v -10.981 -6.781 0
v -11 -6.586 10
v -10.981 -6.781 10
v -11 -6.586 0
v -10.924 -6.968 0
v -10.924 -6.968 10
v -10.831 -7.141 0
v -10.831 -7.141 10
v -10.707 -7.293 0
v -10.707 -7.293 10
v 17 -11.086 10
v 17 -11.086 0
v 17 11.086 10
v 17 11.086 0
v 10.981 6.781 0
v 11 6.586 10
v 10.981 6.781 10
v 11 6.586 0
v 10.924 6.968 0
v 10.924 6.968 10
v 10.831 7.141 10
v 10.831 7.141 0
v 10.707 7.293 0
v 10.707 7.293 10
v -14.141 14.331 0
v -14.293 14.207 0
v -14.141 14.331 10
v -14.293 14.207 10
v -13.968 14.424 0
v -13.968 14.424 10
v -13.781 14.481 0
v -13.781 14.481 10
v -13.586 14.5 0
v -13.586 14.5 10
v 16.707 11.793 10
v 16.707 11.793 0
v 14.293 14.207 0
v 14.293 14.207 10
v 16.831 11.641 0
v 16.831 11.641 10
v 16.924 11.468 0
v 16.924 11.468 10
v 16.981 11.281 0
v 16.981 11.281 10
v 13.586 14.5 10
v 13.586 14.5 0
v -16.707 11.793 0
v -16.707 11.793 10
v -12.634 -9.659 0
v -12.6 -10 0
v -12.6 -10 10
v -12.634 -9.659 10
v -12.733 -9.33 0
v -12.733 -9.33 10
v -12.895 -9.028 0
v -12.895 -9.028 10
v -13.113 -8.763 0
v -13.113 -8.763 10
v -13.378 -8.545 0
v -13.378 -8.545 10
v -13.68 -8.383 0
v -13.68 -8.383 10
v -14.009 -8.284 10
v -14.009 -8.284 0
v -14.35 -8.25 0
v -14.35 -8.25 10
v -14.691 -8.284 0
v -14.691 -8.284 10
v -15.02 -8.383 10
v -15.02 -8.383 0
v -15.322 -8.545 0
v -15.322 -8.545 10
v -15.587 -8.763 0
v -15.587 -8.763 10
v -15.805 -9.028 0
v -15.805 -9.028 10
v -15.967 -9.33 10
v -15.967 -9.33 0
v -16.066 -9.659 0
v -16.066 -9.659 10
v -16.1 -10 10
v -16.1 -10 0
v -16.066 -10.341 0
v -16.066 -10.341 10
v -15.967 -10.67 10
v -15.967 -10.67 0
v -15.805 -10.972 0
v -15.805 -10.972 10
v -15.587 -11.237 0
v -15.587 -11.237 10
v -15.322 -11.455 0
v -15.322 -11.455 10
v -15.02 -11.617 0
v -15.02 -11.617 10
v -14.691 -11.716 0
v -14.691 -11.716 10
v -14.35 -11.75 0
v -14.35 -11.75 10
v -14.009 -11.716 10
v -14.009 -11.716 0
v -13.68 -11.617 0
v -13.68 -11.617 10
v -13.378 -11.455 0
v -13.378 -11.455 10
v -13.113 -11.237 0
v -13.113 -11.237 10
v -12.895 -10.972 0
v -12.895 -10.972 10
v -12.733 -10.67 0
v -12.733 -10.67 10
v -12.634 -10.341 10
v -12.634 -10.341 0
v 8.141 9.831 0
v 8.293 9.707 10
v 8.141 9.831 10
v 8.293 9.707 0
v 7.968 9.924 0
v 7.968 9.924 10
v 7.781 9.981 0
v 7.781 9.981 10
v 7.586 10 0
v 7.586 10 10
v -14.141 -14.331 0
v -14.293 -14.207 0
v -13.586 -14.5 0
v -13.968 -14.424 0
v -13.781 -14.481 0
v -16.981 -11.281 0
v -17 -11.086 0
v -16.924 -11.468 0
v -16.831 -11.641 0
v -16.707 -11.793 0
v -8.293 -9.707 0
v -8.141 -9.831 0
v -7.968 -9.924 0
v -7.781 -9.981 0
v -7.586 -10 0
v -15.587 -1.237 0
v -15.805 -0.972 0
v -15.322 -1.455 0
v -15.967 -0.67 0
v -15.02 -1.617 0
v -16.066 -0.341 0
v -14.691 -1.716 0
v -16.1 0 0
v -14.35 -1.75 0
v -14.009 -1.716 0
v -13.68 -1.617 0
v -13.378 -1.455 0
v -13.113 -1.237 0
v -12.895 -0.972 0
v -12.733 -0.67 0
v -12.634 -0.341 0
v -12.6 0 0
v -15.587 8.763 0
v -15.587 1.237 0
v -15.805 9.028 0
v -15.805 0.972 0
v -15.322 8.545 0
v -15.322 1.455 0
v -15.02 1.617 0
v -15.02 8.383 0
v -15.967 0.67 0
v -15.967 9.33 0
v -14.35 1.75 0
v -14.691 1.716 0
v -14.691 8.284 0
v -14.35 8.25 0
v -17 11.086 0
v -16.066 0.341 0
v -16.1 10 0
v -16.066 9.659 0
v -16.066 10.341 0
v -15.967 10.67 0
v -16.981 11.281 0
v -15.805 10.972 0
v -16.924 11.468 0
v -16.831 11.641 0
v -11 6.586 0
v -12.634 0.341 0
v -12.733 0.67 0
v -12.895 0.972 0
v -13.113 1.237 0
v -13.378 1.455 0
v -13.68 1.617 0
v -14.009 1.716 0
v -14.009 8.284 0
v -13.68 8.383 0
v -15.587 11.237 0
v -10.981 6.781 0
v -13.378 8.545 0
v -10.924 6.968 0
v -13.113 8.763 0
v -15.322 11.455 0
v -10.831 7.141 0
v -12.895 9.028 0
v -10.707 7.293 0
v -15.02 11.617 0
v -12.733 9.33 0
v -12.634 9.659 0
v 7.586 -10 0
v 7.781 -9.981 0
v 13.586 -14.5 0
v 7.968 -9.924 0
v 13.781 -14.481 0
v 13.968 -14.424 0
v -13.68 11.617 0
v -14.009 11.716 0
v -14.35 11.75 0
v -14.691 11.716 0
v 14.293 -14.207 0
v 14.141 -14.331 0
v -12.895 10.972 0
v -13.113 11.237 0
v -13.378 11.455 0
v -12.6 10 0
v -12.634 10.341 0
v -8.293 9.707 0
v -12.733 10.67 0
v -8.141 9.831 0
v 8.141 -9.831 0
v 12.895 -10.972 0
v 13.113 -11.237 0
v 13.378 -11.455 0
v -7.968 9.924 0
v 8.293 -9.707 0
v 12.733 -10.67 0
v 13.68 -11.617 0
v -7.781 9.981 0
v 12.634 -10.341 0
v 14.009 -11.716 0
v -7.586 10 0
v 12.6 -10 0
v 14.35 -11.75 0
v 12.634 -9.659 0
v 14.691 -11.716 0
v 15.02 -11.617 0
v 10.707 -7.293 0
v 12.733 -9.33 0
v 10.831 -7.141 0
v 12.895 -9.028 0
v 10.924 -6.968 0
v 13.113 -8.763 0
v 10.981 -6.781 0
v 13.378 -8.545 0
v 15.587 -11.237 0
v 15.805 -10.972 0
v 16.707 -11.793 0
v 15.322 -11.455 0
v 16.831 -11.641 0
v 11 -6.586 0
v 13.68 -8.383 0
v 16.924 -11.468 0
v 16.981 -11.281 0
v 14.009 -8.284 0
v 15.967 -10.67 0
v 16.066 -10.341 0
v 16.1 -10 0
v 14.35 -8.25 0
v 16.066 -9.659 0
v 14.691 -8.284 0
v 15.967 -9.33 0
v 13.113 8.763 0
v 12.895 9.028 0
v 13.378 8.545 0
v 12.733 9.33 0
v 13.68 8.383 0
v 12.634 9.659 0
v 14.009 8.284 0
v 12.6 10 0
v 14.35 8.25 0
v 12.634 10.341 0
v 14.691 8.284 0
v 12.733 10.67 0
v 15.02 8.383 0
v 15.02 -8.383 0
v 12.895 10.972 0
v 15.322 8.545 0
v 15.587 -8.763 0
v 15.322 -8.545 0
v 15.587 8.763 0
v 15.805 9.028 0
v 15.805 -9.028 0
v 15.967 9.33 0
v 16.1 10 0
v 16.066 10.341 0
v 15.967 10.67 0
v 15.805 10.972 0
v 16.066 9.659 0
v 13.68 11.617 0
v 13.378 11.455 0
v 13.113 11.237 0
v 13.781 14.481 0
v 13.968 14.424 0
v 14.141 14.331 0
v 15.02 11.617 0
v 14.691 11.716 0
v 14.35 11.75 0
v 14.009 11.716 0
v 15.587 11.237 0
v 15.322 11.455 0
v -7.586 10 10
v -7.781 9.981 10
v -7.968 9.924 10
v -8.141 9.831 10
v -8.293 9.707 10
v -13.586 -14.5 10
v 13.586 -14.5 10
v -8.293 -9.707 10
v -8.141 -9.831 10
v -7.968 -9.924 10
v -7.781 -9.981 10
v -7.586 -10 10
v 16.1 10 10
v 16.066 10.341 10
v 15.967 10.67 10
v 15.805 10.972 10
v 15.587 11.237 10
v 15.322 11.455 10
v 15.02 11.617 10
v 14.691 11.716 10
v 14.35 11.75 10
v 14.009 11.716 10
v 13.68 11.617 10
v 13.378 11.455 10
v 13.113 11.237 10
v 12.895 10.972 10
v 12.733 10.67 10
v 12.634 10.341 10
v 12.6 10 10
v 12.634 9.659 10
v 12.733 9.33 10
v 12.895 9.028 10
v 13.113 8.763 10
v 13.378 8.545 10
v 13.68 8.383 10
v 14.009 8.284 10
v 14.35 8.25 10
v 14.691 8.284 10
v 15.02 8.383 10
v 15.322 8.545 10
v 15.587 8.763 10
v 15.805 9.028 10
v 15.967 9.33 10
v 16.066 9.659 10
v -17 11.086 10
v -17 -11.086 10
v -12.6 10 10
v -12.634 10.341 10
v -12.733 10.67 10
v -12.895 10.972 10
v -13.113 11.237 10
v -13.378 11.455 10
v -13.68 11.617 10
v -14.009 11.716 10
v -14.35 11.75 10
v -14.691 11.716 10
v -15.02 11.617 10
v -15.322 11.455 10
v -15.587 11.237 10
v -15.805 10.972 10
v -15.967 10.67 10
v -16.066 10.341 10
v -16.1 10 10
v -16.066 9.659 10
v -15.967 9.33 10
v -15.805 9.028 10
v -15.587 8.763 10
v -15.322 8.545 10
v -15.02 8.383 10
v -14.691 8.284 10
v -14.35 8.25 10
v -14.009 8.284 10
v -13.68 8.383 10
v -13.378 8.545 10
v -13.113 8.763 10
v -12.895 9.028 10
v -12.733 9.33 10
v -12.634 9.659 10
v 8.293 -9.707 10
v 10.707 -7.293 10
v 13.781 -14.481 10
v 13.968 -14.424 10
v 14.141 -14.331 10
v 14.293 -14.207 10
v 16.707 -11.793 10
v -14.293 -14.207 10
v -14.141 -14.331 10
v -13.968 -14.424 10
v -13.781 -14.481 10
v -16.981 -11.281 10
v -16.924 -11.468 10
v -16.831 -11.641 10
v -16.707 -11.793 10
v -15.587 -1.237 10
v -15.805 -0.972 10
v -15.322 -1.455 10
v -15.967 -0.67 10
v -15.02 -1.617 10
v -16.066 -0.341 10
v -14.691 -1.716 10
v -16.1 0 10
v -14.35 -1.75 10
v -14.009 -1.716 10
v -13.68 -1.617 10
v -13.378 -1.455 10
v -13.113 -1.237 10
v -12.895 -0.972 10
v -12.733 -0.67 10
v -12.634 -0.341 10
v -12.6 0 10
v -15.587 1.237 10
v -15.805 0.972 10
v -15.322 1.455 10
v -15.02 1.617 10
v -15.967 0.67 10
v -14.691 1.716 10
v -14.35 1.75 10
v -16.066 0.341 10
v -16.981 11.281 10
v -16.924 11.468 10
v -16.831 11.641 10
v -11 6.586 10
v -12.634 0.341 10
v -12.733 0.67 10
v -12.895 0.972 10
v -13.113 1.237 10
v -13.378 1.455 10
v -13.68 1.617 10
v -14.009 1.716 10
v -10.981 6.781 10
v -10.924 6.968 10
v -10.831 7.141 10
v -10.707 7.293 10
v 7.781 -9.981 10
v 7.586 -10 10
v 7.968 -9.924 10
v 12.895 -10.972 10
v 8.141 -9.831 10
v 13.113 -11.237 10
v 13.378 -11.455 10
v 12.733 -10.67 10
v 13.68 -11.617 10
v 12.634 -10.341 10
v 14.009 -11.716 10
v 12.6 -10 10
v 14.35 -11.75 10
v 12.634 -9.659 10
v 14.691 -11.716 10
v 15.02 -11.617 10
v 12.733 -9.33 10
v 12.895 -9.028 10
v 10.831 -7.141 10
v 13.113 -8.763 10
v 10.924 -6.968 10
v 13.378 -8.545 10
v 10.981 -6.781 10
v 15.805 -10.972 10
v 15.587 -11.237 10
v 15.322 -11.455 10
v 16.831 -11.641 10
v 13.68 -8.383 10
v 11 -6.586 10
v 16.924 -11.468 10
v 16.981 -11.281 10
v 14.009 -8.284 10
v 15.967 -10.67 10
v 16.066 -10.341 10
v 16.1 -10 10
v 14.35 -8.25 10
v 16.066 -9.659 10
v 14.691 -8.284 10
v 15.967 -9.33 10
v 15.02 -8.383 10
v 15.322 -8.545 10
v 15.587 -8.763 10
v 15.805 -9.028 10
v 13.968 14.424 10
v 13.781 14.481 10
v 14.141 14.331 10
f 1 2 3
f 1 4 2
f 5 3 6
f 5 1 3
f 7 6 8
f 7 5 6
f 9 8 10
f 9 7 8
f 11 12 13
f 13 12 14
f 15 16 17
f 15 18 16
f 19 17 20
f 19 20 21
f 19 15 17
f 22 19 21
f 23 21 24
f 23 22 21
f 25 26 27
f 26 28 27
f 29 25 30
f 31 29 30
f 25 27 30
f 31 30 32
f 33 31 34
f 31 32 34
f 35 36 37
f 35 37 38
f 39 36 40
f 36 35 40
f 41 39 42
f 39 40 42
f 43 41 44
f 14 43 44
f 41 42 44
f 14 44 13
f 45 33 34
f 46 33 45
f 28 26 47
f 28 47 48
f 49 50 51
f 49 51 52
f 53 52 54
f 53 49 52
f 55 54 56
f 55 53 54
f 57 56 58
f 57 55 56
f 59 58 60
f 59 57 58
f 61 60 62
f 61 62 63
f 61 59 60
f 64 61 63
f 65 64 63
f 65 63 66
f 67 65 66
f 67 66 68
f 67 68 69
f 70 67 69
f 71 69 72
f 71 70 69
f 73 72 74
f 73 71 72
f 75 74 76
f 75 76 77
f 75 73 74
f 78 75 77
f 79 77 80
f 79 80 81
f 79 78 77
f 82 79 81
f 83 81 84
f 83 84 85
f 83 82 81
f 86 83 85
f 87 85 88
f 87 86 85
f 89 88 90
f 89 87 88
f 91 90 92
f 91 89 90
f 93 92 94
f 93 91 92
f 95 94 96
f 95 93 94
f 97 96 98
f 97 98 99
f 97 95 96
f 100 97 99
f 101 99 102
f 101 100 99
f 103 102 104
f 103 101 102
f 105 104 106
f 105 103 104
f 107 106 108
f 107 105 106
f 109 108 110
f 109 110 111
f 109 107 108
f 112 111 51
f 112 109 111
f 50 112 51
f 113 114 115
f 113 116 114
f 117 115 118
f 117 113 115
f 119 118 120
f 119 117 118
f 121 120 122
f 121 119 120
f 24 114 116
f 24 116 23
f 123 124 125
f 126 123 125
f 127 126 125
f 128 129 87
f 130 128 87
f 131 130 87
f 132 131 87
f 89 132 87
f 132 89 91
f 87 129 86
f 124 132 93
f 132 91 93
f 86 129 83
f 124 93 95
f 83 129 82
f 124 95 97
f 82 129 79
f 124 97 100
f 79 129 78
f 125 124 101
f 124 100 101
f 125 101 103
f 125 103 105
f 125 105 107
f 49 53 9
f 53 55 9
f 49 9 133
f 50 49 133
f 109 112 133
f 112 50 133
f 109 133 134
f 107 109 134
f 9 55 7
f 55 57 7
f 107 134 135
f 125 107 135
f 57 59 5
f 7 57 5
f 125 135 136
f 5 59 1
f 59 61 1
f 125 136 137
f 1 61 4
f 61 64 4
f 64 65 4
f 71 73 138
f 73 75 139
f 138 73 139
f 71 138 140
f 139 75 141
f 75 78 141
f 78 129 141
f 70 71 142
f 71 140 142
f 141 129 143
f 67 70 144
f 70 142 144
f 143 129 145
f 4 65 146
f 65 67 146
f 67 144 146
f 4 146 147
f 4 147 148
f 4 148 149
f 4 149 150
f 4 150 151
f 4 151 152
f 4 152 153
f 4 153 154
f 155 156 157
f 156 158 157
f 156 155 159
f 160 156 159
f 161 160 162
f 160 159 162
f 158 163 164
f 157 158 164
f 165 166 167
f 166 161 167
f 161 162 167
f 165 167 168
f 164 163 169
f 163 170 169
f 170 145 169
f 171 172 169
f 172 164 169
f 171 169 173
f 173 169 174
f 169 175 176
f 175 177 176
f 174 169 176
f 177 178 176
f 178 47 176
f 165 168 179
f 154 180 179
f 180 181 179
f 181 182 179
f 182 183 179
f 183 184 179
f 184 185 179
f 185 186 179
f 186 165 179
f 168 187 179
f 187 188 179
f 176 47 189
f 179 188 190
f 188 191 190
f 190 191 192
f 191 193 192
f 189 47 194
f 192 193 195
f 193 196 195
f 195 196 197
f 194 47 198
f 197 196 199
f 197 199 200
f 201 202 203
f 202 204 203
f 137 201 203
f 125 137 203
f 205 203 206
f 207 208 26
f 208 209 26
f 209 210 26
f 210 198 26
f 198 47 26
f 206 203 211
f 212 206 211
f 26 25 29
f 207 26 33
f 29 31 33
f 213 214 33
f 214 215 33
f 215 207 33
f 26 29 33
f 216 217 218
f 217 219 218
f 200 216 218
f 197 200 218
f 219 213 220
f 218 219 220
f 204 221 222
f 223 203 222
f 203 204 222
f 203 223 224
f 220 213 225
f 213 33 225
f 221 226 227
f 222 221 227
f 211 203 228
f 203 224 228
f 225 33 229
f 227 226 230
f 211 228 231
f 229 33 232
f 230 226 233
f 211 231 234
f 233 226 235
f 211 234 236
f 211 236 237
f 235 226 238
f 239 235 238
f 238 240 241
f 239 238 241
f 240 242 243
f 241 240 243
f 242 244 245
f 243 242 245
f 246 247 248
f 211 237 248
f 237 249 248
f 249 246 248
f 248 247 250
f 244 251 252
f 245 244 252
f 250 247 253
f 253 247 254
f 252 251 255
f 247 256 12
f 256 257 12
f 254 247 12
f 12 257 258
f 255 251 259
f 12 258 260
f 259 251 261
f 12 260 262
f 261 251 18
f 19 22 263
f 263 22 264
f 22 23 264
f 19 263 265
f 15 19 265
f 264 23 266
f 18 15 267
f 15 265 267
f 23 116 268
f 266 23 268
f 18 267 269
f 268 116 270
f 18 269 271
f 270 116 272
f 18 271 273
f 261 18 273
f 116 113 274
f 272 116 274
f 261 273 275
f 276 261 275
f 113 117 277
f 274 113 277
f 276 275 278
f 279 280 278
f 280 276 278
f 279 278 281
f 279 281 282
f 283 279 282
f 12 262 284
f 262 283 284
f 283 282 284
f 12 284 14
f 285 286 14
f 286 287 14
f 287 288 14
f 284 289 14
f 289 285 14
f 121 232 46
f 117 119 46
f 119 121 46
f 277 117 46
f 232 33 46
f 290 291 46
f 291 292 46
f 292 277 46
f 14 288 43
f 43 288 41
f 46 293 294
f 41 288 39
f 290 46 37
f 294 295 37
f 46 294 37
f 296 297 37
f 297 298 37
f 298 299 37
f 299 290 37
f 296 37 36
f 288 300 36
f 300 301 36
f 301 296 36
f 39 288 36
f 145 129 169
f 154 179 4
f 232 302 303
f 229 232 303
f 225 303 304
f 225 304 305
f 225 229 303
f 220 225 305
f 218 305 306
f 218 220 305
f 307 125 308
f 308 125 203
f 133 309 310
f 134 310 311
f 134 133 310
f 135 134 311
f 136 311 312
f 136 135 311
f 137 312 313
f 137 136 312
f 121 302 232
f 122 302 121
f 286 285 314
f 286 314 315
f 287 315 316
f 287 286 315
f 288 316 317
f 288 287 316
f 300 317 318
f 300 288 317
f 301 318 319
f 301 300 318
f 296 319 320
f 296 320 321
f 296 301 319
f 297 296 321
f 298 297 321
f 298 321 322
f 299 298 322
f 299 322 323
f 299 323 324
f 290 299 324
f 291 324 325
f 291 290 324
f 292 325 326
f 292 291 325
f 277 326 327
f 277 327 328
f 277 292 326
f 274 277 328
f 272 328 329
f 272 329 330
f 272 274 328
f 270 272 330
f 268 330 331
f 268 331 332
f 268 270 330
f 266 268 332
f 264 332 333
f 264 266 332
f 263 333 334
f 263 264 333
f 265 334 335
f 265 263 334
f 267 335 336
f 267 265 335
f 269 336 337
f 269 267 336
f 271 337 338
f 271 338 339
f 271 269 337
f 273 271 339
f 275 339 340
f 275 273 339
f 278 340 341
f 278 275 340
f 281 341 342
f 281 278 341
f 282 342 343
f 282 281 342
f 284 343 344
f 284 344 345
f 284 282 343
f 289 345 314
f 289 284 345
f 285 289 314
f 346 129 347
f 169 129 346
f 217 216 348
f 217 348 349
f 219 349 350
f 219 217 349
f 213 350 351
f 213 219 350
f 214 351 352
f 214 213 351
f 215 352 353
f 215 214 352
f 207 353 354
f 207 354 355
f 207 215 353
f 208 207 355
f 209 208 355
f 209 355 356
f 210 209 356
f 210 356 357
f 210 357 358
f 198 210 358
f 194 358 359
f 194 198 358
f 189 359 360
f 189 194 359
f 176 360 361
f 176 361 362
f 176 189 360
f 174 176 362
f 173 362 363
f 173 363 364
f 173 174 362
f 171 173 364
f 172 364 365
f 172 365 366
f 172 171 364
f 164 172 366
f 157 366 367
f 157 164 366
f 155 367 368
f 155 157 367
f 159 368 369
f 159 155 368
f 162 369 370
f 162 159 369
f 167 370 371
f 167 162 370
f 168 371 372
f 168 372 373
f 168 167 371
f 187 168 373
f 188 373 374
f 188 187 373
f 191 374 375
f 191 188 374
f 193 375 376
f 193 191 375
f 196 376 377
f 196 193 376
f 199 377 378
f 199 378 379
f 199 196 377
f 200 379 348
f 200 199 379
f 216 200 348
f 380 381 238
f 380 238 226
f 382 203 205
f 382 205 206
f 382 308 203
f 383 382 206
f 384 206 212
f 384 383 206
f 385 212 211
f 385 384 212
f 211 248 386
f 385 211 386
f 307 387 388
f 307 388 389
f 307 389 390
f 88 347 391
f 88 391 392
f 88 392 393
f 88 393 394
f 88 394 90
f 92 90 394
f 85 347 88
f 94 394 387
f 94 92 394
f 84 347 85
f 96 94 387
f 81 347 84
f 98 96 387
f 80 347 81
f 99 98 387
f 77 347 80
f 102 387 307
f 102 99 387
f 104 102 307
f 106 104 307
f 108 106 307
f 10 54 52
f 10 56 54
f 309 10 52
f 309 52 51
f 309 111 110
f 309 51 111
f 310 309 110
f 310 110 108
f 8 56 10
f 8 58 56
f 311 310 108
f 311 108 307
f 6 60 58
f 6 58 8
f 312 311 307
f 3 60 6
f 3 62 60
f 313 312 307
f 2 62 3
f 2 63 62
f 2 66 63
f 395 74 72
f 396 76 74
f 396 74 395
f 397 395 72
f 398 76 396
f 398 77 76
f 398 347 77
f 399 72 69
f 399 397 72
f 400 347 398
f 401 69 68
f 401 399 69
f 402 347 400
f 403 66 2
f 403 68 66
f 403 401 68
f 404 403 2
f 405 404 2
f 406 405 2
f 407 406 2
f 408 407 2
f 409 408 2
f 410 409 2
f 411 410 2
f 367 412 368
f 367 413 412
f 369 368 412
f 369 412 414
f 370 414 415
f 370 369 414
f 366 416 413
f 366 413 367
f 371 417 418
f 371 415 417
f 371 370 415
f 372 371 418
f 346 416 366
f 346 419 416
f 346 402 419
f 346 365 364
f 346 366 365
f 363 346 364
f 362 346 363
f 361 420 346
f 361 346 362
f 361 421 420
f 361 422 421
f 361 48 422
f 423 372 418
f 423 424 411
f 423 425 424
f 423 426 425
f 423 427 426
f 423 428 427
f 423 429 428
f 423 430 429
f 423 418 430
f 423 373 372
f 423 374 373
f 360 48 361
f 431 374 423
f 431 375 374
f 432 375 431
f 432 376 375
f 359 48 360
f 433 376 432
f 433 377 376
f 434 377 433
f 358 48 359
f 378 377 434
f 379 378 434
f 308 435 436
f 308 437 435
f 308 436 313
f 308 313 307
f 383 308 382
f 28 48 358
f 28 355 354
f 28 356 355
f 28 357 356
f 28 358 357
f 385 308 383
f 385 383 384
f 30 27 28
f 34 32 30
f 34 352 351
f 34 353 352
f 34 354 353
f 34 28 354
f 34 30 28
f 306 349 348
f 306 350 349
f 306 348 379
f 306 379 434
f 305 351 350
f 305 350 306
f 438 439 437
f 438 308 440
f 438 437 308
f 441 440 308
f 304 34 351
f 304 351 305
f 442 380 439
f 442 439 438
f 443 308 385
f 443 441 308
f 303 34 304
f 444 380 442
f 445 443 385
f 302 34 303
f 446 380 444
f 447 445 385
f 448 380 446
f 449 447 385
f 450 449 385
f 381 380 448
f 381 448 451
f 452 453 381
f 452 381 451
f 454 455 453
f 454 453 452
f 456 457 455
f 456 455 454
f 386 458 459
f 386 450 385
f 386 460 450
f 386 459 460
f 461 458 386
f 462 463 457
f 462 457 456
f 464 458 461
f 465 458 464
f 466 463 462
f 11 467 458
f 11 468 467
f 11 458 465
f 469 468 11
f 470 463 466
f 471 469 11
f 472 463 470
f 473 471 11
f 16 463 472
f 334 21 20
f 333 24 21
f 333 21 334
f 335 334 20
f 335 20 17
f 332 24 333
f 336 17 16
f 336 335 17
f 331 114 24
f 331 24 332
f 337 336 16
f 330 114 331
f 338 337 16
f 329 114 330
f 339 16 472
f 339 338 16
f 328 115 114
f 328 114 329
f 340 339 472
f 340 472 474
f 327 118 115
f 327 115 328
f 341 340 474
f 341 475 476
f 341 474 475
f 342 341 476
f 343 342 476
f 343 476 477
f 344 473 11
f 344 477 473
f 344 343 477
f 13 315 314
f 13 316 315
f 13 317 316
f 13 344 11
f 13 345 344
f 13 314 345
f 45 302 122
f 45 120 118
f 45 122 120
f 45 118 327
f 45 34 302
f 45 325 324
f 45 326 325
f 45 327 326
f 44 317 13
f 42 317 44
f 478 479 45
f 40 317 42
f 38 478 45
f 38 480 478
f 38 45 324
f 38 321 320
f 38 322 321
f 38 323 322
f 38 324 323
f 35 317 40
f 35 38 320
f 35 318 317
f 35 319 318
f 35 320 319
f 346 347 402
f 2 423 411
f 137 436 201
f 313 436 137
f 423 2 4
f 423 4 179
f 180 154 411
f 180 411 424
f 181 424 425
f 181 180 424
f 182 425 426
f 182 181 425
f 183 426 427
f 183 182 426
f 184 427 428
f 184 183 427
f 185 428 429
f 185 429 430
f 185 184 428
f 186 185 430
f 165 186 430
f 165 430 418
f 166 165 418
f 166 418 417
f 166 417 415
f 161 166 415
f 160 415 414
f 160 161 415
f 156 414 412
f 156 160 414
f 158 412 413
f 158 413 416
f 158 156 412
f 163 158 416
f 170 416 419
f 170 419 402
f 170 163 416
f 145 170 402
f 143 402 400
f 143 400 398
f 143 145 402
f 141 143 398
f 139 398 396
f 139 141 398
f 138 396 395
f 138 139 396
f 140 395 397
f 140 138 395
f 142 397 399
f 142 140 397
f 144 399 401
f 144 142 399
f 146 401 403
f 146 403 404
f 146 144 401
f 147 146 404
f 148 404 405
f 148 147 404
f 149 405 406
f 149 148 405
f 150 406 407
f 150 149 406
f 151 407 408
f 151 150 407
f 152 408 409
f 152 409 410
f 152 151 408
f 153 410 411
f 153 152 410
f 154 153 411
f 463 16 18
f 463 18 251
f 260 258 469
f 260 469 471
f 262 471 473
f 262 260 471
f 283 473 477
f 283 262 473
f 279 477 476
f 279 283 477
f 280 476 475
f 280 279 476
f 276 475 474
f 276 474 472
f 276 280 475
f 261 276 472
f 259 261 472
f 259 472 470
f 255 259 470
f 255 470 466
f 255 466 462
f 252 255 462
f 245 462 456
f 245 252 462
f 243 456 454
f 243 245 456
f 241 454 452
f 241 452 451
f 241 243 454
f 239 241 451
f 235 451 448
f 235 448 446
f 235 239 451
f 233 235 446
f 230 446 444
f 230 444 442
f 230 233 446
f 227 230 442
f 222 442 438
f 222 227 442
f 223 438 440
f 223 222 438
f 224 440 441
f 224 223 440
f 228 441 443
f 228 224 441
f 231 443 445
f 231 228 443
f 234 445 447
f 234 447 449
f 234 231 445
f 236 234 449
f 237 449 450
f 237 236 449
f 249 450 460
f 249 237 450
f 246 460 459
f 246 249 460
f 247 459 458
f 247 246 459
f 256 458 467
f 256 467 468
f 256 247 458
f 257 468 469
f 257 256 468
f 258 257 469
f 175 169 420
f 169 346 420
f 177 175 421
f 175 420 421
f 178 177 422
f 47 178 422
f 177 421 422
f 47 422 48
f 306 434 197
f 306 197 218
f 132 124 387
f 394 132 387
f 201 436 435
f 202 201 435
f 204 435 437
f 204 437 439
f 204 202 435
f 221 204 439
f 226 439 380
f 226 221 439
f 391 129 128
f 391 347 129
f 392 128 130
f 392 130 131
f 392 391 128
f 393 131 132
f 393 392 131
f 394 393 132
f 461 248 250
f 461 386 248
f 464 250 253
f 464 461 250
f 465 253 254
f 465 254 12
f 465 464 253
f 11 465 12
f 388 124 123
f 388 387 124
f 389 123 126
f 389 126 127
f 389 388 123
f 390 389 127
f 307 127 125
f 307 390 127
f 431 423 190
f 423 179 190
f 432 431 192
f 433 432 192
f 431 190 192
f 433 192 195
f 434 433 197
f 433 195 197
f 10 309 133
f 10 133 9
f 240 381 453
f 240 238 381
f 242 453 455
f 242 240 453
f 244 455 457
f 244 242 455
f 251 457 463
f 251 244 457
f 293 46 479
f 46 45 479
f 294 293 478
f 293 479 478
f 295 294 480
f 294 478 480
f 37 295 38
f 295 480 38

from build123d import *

# Parameters (mm, degrees)
SKETCH_1_W          = 34
SKETCH_1_H          = 29
SKETCH_1_R          = 1.75
EXTRUDE_1_DEPTH     = 10
CHAMFER_1_SIZE      = 3
CUT_EXTRUDE_1_DEPTH = 11
FILLET_1_R          = 1


with BuildPart() as part:
    # 草图1 → 凸台-拉伸1 (new body)
    with BuildSketch(Plane.XY):
        Rectangle(SKETCH_1_W, SKETCH_1_H)
        with Locations((-14.35, -10)):
            Circle(SKETCH_1_R, mode=Mode.SUBTRACT)
        with Locations((-14.35, 10)):
            Circle(SKETCH_1_R, mode=Mode.SUBTRACT)
        with Locations((14.35, 10)):
            Circle(SKETCH_1_R, mode=Mode.SUBTRACT)
        with Locations((14.35, -10)):
            Circle(SKETCH_1_R, mode=Mode.SUBTRACT)
        with Locations((-14.35, 0)):
            Circle(SKETCH_1_R, mode=Mode.SUBTRACT)
    extrude(amount=EXTRUDE_1_DEPTH)

    # 倒角1
    chamfer_1_edges = [part.edges().sort_by_distance(p)[0] for p in [
        (17, -14.5, 5),
        (-17, -14.5, 5),
        (-17, 14.5, 5),
        (17, 14.5, 5),
    ]]
    chamfer(chamfer_1_edges, length=CHAMFER_1_SIZE)

    # 草图2 → 切除-拉伸1 (cut, through all)
    with BuildSketch(Plane.XY.offset(10)):
        Polygon((-11, 7), (-8, 10), (8, 10), (11, 7), (11, -7), (8, -10), (-8, -10), (-11, -7), align=None)
    extrude(amount=-CUT_EXTRUDE_1_DEPTH, mode=Mode.SUBTRACT)

    # 圆角1
    fillet_1_edges = [part.edges().sort_by_distance(p)[0] for p in [
        (17, 11.5, 5),
        (17, -11.5, 5),
        (-14, -14.5, 5),
        (14, -14.5, 5),
        (-14, 14.5, 5),
        (14, 14.5, 5),
        (-17, 11.5, 5),
        (-17, -11.5, 5),
        (-8, 10, 5),
        (8, 10, 5),
        (11, 7, 5),
        (11, -7, 5),
        (8, -10, 5),
        (-8, -10, 5),
        (-11, -7, 5),
        (-11, 7, 5),
    ]]
    fillet(fillet_1_edges, radius=FILLET_1_R)


solid = part.part
